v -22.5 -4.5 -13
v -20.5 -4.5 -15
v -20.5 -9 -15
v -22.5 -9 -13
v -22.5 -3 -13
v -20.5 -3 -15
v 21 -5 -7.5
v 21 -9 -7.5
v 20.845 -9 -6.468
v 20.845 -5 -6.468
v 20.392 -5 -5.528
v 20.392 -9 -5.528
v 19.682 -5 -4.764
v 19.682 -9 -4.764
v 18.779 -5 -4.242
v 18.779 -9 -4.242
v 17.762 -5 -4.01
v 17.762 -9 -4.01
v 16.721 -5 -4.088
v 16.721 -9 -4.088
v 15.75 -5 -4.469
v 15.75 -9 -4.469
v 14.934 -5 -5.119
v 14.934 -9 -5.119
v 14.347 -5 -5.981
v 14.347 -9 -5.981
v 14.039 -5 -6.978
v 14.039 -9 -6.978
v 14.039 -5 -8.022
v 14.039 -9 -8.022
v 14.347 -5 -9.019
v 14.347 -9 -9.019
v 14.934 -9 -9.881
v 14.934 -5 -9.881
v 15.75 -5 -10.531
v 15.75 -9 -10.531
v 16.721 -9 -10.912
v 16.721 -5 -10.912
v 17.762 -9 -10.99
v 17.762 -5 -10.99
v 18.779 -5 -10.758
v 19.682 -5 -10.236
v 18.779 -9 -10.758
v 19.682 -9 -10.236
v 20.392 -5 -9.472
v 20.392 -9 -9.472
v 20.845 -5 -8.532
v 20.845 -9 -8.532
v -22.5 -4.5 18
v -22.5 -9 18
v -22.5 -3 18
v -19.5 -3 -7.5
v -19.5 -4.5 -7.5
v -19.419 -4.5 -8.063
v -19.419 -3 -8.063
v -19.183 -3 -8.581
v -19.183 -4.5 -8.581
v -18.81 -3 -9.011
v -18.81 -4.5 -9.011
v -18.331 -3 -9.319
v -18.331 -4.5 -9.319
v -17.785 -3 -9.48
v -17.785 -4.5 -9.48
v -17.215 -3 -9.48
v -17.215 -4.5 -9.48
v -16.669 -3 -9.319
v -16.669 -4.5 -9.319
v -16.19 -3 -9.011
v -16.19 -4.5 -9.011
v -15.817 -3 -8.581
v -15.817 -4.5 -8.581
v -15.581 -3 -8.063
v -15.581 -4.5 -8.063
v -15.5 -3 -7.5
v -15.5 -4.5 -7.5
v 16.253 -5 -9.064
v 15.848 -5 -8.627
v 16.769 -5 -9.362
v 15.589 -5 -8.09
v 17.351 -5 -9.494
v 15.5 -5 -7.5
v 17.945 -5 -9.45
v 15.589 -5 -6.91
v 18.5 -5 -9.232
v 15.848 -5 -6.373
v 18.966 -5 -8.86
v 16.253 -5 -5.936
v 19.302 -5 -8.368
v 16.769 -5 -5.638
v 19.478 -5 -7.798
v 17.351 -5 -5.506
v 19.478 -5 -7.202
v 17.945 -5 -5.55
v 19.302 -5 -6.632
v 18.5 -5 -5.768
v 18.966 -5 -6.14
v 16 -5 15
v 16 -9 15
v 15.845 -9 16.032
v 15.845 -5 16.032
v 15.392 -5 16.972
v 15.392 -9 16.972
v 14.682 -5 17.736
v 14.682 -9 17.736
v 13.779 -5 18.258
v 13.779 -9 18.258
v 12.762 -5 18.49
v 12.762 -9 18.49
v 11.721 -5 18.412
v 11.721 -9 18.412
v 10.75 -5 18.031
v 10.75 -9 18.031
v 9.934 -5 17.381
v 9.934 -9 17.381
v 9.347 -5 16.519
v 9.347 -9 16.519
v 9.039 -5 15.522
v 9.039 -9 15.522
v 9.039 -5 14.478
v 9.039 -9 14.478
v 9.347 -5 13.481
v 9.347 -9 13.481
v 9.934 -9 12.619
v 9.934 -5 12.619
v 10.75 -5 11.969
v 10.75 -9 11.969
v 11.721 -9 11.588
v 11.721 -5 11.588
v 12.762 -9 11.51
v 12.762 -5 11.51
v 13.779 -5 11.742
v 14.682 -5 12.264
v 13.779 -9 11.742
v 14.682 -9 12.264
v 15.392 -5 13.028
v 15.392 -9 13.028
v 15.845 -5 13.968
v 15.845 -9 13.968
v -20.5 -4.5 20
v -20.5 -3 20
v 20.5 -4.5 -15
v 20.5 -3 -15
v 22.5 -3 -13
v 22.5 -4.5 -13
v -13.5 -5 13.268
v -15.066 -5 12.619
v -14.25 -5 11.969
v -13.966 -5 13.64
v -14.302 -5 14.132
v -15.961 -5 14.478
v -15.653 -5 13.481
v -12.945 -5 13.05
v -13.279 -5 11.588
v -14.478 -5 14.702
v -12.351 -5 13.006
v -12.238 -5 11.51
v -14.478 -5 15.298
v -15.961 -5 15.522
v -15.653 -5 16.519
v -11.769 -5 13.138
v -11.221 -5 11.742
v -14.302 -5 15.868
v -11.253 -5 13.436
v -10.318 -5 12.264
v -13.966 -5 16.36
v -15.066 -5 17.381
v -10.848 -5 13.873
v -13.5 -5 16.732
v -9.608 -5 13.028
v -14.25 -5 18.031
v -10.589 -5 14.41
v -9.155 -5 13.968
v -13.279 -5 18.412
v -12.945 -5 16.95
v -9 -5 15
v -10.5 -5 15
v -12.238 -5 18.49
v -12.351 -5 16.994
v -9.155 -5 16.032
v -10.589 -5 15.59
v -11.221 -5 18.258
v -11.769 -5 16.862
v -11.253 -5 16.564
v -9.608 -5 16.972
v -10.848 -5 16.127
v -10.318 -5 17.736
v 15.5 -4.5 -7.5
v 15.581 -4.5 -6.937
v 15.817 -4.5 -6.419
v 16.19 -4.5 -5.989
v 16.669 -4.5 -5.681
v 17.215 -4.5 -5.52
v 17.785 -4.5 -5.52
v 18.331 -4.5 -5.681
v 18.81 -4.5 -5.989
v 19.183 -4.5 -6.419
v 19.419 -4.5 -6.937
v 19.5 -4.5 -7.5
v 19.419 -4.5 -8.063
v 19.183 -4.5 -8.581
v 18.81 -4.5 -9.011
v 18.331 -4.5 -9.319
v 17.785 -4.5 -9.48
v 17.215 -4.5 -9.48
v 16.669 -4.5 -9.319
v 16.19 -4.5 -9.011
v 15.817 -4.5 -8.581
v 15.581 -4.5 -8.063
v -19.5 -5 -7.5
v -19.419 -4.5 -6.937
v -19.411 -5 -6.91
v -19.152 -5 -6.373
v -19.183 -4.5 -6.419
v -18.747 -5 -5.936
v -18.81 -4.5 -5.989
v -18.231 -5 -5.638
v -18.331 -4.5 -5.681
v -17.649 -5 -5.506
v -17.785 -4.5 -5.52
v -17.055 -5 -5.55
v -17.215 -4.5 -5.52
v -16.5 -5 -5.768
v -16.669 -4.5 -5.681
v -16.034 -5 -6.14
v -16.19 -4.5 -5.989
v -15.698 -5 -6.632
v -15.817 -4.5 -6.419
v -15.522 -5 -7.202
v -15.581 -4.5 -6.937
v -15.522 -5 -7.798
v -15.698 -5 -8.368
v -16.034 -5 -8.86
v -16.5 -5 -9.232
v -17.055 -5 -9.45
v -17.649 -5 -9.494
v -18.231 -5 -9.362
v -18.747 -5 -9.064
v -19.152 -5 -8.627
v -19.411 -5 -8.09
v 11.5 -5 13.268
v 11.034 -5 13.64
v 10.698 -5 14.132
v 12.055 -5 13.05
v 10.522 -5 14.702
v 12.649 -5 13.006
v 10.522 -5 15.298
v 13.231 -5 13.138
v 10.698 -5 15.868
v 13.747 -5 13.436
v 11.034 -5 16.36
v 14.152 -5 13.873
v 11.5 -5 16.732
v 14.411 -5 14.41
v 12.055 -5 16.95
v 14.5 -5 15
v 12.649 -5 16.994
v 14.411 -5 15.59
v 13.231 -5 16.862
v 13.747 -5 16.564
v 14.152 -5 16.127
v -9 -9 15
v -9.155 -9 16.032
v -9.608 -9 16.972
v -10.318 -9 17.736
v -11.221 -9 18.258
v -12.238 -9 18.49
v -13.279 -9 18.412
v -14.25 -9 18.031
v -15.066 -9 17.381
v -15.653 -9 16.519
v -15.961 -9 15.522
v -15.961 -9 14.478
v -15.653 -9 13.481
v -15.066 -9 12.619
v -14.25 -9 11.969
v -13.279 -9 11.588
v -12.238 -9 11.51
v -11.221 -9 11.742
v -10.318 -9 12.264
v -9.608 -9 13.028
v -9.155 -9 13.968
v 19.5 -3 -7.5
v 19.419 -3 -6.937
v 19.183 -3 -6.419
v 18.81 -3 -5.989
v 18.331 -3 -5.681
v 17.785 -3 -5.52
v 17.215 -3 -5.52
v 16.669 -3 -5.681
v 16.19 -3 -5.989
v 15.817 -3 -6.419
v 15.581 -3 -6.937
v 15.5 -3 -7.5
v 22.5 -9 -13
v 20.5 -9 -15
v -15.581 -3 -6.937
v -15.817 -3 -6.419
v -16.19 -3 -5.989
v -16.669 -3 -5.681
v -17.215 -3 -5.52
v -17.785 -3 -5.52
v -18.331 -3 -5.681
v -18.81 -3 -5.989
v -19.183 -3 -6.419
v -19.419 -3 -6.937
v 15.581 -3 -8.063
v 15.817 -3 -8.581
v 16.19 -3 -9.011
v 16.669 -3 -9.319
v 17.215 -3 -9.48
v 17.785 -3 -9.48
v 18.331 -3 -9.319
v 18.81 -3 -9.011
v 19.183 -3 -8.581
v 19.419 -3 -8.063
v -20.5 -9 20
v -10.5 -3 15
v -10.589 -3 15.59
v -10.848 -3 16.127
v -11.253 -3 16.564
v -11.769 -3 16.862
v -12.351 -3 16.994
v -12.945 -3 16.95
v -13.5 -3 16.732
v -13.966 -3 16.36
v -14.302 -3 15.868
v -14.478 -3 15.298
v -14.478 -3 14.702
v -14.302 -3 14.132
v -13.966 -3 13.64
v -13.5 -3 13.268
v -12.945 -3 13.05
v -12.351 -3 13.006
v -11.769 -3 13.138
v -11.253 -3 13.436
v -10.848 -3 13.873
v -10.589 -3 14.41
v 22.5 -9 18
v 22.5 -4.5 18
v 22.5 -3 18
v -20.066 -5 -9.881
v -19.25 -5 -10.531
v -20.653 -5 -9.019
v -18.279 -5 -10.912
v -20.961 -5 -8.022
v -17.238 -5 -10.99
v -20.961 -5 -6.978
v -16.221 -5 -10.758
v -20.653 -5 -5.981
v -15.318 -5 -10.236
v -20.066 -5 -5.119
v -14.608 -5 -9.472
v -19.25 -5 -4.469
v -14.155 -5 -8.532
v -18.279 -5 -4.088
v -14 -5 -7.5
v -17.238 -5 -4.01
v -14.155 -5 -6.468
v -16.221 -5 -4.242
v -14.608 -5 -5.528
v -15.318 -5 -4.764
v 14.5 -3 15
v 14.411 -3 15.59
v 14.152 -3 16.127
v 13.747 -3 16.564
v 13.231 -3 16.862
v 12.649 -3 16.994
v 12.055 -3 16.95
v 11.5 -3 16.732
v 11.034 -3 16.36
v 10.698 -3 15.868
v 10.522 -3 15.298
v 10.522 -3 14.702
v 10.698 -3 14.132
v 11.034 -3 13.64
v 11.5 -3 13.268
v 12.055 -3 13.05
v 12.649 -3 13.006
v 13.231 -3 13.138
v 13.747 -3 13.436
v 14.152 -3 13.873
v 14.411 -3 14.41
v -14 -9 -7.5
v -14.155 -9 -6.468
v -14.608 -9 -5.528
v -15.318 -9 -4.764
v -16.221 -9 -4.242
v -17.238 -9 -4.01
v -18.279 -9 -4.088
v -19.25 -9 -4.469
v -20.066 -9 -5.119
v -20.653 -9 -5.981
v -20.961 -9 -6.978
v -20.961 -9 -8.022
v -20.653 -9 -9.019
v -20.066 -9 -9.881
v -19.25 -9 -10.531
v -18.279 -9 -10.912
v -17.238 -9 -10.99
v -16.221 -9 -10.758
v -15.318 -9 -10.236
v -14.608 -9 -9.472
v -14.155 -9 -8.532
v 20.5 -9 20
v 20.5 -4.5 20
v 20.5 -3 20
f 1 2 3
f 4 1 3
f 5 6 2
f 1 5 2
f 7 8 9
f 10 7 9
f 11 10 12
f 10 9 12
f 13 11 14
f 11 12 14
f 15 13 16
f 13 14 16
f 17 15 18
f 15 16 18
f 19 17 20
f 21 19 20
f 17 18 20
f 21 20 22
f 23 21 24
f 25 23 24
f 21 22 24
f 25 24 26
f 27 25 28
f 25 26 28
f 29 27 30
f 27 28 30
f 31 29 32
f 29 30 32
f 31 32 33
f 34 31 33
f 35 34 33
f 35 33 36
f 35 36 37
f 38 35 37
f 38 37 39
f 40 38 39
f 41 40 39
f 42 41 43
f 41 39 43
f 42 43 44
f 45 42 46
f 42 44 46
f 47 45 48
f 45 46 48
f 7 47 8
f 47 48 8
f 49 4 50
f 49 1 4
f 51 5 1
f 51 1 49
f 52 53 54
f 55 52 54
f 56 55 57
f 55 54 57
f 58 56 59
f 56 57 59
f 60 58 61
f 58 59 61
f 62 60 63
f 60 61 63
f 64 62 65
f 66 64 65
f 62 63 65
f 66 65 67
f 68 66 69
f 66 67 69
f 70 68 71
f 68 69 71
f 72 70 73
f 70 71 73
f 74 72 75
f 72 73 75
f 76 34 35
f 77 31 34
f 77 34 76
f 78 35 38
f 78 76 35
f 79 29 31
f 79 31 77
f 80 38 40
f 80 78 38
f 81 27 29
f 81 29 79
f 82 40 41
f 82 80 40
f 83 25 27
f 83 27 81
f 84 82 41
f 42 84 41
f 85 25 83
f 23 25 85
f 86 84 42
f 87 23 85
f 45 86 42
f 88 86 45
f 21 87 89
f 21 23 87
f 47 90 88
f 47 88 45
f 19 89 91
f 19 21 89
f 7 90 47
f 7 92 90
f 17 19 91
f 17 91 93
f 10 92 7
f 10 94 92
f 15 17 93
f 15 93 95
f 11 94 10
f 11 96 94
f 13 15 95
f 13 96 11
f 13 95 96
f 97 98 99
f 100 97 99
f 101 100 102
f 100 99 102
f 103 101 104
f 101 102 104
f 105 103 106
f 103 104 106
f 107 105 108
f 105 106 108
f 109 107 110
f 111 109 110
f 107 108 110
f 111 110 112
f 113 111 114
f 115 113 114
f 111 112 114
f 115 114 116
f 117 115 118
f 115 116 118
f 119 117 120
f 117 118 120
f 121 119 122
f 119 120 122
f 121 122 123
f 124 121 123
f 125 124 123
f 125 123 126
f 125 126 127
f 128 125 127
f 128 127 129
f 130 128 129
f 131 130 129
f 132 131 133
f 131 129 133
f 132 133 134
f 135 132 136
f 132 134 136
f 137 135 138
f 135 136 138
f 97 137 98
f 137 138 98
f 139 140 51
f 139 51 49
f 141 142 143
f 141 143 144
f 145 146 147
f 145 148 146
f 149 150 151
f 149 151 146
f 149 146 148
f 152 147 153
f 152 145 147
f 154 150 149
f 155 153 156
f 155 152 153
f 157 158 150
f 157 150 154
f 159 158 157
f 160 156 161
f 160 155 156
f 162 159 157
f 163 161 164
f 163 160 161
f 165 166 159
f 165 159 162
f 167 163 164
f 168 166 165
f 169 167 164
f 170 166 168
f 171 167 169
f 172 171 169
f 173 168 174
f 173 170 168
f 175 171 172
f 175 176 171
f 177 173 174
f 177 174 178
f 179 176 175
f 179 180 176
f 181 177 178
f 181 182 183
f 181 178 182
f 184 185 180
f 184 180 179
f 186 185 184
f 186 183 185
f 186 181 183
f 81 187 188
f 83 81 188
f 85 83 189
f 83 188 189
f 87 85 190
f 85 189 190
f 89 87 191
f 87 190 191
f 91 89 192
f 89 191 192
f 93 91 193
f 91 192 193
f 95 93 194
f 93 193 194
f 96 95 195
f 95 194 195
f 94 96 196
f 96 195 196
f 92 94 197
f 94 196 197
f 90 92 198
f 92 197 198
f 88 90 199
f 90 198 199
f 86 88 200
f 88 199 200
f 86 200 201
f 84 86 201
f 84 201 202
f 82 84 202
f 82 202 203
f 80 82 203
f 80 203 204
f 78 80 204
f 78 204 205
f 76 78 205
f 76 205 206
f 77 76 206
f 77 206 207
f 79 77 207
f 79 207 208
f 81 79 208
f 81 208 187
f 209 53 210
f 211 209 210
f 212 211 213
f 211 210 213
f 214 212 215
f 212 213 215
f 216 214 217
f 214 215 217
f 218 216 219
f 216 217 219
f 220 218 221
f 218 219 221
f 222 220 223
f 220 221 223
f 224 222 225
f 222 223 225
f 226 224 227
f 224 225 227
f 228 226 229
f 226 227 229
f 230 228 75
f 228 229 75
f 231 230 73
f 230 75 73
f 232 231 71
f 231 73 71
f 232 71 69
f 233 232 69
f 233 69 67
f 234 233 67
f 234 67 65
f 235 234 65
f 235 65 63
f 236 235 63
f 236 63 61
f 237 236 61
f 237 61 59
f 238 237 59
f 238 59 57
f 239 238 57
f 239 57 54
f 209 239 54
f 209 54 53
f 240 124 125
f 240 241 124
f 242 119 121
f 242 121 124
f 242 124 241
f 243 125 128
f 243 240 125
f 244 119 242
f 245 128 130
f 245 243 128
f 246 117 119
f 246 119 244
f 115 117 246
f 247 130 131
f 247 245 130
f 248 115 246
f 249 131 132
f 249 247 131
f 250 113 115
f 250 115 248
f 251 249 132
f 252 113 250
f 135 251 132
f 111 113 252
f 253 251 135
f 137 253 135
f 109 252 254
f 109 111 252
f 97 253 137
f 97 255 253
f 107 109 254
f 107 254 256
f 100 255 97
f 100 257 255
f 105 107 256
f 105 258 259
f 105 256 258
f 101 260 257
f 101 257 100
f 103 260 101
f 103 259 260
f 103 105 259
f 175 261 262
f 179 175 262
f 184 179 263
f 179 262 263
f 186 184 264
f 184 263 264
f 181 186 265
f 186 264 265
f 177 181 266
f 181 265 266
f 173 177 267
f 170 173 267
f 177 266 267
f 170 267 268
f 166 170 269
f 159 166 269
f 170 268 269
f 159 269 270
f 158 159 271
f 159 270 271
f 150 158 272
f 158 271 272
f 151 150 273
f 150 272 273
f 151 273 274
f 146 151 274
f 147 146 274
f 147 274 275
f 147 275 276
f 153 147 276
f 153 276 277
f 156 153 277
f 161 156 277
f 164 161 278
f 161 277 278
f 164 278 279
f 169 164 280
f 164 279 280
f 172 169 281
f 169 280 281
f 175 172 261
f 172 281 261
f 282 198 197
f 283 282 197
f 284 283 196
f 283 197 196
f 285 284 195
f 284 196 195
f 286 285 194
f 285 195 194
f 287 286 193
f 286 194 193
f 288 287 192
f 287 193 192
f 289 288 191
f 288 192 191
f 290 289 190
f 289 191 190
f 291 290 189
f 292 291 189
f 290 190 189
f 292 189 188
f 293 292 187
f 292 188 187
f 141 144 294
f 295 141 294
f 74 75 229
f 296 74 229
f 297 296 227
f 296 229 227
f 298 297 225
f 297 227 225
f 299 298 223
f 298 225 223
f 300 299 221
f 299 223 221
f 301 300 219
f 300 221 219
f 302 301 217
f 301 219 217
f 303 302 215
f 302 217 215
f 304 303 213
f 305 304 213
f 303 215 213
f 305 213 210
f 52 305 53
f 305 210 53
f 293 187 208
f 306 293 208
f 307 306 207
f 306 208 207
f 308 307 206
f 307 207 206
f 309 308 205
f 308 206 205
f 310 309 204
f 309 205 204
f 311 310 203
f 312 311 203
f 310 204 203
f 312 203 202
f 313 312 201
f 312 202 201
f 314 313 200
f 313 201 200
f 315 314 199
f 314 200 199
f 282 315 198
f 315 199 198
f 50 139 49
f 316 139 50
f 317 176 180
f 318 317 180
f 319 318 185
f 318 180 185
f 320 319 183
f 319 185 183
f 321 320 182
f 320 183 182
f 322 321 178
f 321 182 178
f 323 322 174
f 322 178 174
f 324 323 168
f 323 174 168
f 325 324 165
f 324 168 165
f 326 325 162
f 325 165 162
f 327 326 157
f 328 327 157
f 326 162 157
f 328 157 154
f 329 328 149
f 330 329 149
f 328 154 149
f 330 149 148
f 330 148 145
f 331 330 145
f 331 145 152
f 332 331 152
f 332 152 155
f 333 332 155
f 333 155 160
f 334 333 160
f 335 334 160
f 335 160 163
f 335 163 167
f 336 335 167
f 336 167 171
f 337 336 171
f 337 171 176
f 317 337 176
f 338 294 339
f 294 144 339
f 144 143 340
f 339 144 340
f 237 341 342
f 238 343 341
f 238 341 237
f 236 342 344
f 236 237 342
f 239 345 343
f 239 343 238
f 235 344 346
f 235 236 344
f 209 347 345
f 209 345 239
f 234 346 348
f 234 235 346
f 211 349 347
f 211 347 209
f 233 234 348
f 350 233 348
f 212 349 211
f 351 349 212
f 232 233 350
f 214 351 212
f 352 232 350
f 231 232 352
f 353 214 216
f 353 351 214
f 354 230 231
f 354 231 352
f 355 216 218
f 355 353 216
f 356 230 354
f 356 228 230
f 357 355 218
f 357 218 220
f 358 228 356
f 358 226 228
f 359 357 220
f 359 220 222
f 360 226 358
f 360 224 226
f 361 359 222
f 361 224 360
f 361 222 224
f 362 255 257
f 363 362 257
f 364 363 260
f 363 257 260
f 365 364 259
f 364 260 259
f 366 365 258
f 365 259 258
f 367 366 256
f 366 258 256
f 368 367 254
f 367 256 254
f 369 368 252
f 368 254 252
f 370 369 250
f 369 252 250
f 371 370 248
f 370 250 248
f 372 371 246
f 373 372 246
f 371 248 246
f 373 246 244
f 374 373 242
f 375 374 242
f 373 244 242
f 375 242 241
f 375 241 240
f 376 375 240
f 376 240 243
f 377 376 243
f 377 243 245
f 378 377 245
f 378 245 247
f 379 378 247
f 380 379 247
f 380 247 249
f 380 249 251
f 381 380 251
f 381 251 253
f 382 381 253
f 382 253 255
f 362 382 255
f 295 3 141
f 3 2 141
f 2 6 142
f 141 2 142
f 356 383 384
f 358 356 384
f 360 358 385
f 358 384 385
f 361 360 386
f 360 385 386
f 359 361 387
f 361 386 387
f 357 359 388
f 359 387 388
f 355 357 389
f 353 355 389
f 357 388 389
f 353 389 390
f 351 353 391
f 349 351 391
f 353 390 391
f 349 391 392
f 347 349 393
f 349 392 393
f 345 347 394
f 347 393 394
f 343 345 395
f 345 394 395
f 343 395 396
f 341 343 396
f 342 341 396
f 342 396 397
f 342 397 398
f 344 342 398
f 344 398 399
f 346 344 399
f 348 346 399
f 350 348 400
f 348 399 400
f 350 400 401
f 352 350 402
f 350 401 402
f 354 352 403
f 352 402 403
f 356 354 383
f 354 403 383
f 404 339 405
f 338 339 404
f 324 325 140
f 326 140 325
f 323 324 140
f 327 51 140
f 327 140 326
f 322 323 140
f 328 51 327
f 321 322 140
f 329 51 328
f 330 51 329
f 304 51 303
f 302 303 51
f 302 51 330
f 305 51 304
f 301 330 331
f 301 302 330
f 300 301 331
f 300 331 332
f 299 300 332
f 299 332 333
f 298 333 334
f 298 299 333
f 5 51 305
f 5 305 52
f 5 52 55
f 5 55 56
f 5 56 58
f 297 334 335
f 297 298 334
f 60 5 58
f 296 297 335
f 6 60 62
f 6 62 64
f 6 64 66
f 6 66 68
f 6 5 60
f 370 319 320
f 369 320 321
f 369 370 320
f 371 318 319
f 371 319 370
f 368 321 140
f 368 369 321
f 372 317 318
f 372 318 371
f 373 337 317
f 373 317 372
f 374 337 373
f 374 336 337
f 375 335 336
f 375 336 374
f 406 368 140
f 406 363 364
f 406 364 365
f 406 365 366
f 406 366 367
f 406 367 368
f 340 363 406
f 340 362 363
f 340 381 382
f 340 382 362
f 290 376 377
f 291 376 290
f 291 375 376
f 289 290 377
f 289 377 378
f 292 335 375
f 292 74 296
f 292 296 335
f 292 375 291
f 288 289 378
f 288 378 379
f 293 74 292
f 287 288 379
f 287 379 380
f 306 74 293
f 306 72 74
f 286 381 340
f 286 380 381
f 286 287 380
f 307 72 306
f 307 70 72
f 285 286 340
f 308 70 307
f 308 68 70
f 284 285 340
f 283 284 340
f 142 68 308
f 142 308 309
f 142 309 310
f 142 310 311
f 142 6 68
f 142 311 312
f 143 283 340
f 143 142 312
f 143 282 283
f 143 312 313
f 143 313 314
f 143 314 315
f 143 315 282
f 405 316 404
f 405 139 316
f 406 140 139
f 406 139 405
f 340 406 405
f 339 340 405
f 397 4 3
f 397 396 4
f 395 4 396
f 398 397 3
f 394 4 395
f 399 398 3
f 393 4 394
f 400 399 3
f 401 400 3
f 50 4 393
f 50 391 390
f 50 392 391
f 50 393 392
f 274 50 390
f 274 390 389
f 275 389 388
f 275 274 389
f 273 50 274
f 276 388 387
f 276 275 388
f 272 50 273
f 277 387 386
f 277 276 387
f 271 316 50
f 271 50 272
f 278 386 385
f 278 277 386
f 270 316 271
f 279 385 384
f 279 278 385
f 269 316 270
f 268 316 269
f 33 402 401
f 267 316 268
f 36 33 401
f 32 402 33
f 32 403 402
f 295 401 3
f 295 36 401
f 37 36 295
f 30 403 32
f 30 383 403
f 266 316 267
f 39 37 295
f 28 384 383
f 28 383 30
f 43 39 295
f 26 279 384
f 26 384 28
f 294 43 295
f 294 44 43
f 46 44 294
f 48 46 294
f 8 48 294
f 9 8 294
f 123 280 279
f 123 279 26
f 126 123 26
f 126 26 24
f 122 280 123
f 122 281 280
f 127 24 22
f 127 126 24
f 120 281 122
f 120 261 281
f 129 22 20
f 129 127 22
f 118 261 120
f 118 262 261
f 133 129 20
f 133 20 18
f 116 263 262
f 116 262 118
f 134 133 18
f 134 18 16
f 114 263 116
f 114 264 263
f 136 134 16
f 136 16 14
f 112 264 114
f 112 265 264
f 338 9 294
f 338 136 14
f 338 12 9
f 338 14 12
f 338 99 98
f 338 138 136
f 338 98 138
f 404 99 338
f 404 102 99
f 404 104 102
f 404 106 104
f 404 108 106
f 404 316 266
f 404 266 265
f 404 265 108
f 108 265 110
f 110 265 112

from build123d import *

# Parameters (mm, degrees)
F0_W      = 45
F0_H      = 35
F1_DEPTH  = 4.5
F2_W      = 15
F2_H      = 1.5
F3_DEPTH  = 35.001
F4_R      = 1.75
F5_DEPTH  = 3.5
F6_R      = 2
F7_DEPTH  = 4.501
F8_W      = 10
F8_H      = 10
F9_DEPTH  = 3
F10_SIZE  = 2
F11_W     = 48.3506806195
F11_H     = 3
F12_DEPTH = 35.001
F13_W     = 45
F13_H     = 35
F14_DEPTH = 4.5
F15_SIZE  = 1.99999
F16_R     = 2
F17_DEPTH = 6.001
F18_R     = 3.5
F19_DEPTH = 4
F20_R     = 3.5
F21_DEPTH = 4
F22_R     = 2
F23_DEPTH = 6.001


# Not quite as in the source:
# - a fillet or chamfer is up to 0.001 mm smaller than in the source, because OpenCascade refuses the exact size


with BuildPart() as f1:
    # F0 (on Front) → F1 (new body)
    with BuildSketch(Plane.XZ):
        with Locations((0, 2.5)):
            Rectangle(F0_W, F0_H)
    extrude(amount=F1_DEPTH)

    # F2 (on face) → F3 (cut, through all)
    with BuildSketch(Plane.XY.offset(20)):
        with Locations((-2.5, -2.25)):
            Rectangle(F2_W, F2_H)
    extrude(amount=-F3_DEPTH, mode=Mode.SUBTRACT)

    # F4 (on face) → F5 (cut)
    with BuildSketch(Plane.XZ.offset(4.5)):
        with Locations((17.5, -7.5)):
            Circle(F4_R)
        with Locations((-17.5, -7.5)):
            Circle(F4_R)
    extrude(amount=-F5_DEPTH, mode=Mode.SUBTRACT)

    # F6 (on face) → F7 (cut, through all)
    with BuildSketch(Plane.XZ.offset(4.5)):
        with Locations((17.5, -7.5)):
            Circle(F6_R)
        with Locations((-17.5, -7.5)):
            Circle(F6_R)
    extrude(amount=-F7_DEPTH, mode=Mode.SUBTRACT)

    # F8 (on face) → F9 (cut)
    with BuildSketch(Plane(origin=(0, 0, 0), x_dir=(-1, 0, 0), z_dir=(0, 1, 0))):
        with Locations((5, 10)):
            Rectangle(F8_W, F8_H)
    extrude(amount=-F9_DEPTH, mode=Mode.SUBTRACT)

    # F10
    f10_edges = [f1.edges().sort_by_distance(p)[0] for p in [
        (-22.5, -2.25, 20),
        (22.5, -2.25, 20),
        (22.5, -2.25, -15),
        (-22.5, -2.25, -15),
    ]]
    chamfer(f10_edges, length=F10_SIZE)

    # F11 (on face) → F12 (cut, through all)
    with BuildSketch(Plane(origin=(0, 0, -15), x_dir=(1, 0, 0), z_dir=(0, 0, -1))):
        with Locations((0.253405422, 1.5)):
            Rectangle(F11_W, F11_H)
    extrude(amount=-F12_DEPTH, mode=Mode.SUBTRACT)

    # F13 (on face) → F14 (join)
    with BuildSketch(Plane.XZ.offset(4.5)):
        with Locations((0, 2.5)):
            Rectangle(F13_W, F13_H)
    extrude(amount=F14_DEPTH)

    # F15 (size 2 in the source; OpenCascade refuses exactly that, so slightly less here)
    f15_edges = [f1.edges().sort_by_distance(p)[0] for p in [
        (-22.5, -6.75, -15),
        (22.5, -6.75, -15),
        (22.5, -6.75, 20),
        (-22.5, -6.75, 20),
    ]]
    chamfer(f15_edges, length=F15_SIZE)

    # F16 (on face) → F17 (cut, through all)
    with BuildSketch(Plane(origin=(0, -3, 0), x_dir=(-1, 0, 0), z_dir=(0, 1, 0))):
        with Locations((17.5, -7.5)):
            Circle(F16_R)
        with Locations((-17.5, -7.5)):
            Circle(F16_R)
    extrude(amount=-F17_DEPTH, mode=Mode.SUBTRACT)

    # F18 (on face) → F19 (cut)
    with BuildSketch(Plane.XZ.offset(9)):
        with Locations((-17.5, -7.5)):
            Circle(F18_R)
        with Locations((17.5, -7.5)):
            Circle(F18_R)
    extrude(amount=-F19_DEPTH, mode=Mode.SUBTRACT)

    # F20 (on face) → F21 (cut)
    with BuildSketch(Plane.XZ.offset(9)):
        with Locations((-12.5, 15)):
            Circle(F20_R)
        with Locations((12.5, 15)):
            Circle(F20_R)
    extrude(amount=-F21_DEPTH, mode=Mode.SUBTRACT)

    # F22 (on face) → F23 (cut, through all)
    with BuildSketch(Plane.XZ.offset(9)):
        with Locations((-12.5, 15)):
            Circle(F22_R)
        with Locations((12.5, 15)):
            Circle(F22_R)
    extrude(amount=-F23_DEPTH, mode=Mode.SUBTRACT)


solid = f1.part
